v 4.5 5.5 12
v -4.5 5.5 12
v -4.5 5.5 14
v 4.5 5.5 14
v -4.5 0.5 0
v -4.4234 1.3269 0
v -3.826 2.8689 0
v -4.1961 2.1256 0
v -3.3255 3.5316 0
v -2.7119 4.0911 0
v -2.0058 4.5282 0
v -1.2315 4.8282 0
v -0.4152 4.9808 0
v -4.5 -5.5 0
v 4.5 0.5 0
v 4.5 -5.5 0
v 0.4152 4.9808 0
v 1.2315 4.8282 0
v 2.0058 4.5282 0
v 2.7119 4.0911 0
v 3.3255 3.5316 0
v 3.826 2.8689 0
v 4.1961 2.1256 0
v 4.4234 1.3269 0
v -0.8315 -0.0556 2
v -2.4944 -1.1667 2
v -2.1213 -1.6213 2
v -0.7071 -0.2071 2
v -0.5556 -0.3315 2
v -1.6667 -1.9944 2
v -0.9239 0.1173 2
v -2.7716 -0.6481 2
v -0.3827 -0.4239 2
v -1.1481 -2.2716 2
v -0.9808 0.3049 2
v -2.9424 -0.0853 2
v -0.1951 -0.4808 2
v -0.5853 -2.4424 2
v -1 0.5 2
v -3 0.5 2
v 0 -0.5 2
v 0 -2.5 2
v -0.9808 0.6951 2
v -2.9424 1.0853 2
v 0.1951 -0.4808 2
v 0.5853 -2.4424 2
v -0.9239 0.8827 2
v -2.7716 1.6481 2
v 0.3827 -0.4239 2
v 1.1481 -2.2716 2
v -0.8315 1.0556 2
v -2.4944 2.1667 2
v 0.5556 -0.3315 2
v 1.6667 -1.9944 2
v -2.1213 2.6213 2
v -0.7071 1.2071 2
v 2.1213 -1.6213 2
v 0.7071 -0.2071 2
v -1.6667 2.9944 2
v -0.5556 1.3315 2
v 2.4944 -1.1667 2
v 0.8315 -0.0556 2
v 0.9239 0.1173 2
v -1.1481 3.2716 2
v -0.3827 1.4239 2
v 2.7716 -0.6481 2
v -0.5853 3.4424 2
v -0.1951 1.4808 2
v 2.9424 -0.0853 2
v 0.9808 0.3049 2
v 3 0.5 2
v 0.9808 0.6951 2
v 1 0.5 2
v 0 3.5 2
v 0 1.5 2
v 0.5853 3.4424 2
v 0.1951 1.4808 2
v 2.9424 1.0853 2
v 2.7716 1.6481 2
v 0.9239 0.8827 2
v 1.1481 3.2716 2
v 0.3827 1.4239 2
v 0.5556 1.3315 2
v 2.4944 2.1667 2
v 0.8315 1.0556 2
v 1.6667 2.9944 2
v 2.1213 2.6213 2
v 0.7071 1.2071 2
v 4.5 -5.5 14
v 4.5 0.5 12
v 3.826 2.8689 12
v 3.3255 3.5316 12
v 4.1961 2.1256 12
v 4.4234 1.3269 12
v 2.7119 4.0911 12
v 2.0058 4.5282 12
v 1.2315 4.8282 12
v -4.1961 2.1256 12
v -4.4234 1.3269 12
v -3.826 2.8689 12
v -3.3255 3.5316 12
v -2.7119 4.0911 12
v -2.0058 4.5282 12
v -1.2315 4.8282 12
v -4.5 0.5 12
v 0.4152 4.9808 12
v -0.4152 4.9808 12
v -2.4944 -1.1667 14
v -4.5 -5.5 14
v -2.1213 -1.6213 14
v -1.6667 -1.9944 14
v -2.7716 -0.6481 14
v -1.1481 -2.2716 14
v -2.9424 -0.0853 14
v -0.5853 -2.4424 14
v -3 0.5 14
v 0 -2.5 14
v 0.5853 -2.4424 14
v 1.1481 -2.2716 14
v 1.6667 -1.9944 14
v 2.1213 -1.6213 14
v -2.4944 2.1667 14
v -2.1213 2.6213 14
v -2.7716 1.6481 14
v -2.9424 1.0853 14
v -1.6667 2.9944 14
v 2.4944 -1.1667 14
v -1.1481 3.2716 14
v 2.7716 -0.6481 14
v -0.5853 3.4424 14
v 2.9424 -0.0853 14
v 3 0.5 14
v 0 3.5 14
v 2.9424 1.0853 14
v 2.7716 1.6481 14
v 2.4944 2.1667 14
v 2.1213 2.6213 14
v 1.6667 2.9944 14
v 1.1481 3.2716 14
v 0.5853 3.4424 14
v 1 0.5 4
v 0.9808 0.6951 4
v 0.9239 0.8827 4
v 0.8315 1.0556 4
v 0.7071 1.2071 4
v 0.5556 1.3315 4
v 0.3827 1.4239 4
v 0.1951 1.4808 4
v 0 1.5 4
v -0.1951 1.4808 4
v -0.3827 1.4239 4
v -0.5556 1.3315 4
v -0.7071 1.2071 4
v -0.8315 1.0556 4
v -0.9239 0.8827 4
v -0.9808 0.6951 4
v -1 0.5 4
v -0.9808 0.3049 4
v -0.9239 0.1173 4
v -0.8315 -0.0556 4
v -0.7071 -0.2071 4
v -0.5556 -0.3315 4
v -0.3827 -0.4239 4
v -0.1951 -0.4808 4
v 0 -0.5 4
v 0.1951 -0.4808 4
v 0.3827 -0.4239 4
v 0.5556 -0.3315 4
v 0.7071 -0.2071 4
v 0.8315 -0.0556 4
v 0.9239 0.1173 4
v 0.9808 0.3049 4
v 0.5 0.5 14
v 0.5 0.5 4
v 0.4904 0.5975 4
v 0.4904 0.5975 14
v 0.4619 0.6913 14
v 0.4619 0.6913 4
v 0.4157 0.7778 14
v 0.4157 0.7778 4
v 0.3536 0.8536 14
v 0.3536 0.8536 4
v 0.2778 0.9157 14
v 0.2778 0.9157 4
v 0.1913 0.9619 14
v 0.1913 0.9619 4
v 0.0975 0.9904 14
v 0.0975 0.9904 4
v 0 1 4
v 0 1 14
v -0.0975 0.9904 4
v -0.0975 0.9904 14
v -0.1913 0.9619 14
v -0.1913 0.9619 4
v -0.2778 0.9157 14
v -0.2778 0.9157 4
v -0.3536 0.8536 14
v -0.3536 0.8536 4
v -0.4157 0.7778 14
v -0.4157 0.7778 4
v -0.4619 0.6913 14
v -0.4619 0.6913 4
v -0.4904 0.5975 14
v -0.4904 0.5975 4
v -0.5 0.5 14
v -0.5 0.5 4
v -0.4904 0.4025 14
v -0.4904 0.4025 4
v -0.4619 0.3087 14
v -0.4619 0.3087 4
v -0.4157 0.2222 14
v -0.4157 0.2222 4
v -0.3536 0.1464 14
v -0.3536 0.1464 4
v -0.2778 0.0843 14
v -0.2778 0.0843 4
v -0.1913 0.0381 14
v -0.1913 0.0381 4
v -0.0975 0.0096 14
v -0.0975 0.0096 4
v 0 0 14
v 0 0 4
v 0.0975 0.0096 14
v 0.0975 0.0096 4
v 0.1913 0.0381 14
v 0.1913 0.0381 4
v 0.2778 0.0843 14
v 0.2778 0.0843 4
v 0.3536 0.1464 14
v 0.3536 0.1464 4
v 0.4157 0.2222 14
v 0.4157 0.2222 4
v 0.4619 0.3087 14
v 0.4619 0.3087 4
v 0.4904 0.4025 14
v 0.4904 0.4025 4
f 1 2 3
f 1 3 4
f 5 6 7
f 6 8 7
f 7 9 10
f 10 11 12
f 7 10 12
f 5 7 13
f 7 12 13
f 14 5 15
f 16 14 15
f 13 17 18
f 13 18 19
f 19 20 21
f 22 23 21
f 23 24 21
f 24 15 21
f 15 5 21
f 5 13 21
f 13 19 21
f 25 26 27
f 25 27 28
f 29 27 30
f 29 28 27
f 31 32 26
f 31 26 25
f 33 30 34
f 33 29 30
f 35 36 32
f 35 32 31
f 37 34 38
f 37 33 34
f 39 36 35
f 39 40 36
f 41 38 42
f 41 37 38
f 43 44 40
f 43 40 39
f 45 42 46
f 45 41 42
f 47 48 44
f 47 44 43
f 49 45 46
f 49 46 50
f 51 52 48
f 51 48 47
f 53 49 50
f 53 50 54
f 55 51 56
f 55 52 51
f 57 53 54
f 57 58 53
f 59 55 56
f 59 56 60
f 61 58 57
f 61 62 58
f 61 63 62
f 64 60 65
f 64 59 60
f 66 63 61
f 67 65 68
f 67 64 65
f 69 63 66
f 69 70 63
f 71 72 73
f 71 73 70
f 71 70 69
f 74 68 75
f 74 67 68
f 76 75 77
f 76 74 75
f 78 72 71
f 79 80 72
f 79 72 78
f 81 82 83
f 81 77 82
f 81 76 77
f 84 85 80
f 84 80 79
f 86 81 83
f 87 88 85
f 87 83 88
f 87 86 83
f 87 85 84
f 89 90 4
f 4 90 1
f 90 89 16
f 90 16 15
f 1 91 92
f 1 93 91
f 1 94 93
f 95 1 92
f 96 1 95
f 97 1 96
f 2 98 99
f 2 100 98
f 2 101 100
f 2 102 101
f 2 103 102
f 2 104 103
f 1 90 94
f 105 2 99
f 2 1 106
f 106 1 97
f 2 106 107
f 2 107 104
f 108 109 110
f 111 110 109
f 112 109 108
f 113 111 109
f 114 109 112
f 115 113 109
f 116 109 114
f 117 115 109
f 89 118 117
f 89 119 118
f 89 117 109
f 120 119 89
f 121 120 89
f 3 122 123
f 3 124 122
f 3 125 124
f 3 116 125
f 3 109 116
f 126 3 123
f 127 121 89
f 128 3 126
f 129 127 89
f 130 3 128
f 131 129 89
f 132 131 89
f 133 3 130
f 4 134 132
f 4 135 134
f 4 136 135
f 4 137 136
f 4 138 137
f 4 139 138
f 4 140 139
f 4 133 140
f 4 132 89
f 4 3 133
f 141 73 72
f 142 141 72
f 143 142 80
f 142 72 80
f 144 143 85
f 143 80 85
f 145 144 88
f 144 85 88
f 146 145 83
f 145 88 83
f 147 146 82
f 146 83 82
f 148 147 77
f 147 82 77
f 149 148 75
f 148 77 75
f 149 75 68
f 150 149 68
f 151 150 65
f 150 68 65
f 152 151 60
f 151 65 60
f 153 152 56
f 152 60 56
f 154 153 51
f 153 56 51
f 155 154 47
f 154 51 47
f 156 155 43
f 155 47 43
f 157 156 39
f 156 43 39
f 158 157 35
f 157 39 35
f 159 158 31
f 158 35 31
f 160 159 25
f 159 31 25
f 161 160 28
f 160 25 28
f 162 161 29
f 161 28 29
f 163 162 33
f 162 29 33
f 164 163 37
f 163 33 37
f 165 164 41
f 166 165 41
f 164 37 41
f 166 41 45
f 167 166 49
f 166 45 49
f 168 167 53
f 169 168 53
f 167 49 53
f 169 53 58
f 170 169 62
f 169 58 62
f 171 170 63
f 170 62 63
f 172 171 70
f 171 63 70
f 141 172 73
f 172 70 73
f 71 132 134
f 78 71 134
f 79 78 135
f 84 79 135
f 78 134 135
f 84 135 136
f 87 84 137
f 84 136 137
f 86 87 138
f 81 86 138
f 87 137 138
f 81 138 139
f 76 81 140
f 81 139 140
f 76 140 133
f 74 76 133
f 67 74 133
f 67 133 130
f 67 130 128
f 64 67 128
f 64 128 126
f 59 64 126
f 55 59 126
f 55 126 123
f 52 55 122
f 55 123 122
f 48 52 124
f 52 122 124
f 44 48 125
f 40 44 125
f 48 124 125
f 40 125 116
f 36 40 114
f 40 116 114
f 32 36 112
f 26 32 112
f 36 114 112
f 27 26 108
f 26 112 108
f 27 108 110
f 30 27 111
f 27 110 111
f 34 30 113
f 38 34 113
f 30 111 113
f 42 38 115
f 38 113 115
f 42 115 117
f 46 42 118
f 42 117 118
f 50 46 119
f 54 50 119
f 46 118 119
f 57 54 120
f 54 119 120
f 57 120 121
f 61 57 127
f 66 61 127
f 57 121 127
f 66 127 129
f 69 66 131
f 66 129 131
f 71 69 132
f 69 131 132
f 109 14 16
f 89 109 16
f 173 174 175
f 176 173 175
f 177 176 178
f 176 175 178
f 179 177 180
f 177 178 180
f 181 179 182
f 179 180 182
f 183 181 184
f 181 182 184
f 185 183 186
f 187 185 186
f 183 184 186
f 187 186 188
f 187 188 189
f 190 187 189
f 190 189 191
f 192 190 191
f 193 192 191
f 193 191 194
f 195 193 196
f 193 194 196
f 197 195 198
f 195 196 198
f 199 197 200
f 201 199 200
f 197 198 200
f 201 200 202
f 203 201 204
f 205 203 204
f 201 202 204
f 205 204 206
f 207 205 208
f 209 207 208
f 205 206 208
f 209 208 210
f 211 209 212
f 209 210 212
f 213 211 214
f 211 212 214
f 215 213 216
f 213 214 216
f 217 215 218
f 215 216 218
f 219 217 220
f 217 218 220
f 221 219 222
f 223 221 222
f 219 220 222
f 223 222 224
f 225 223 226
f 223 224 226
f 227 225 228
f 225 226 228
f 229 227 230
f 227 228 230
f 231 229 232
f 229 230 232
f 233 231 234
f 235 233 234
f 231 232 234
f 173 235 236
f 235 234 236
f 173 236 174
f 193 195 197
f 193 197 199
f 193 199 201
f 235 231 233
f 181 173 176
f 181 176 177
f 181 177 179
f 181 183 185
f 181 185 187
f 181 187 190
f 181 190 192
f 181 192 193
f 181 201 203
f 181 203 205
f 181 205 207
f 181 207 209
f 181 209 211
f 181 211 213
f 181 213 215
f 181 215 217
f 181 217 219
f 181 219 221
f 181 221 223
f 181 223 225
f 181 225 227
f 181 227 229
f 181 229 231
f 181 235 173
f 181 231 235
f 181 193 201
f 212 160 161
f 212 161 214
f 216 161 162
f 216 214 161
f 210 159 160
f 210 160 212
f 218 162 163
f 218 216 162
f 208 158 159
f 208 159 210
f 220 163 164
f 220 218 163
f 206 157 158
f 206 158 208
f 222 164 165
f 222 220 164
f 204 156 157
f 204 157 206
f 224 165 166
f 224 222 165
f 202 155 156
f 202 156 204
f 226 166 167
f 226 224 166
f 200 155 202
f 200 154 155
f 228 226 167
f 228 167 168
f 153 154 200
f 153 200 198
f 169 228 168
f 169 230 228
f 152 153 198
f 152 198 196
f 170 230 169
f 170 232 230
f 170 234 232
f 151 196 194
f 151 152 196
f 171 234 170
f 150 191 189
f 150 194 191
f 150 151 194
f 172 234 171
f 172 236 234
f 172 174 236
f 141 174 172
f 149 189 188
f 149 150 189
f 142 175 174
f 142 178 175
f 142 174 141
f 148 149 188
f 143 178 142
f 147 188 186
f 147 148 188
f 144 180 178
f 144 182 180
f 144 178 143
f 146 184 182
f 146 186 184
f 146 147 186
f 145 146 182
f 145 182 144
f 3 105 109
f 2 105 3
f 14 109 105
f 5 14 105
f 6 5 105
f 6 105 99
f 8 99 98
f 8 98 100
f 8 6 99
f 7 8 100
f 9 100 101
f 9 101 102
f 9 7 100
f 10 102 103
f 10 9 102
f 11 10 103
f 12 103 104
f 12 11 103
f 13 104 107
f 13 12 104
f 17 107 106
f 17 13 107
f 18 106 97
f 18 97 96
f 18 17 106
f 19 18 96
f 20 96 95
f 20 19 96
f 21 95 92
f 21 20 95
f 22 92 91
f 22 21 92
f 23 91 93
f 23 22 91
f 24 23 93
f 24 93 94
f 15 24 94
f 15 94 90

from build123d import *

# Parameters (mm, degrees)
SKETCH1_W           = 9
SKETCH1_H           = 11
BOSS_EXTRUDE1_DEPTH = 14
SKETCH2_R           = 3
CUT_EXTRUDE1_DEPTH  = 12
SKETCH3_OUTSIDE_W   = 14.99
SKETCH3_OUTSIDE_H   = 16.99
CUT_EXTRUDE2_DEPTH  = 12
SKETCH4_R           = 1
BOSS_EXTRUDE2_DEPTH = 2
SKETCH5_R           = 0.5
BOSS_EXTRUDE3_DEPTH = 10


with BuildPart() as part:
    # Sketch1 → Boss-Extrude1 (new body)
    with BuildSketch(Plane.XY):
        Rectangle(SKETCH1_W, SKETCH1_H)
    extrude(amount=BOSS_EXTRUDE1_DEPTH)

    # Sketch2 → Cut-Extrude1 (cut)
    with BuildSketch(Plane.XY.offset(14)):
        with Locations((0, 0.5)):
            Circle(SKETCH2_R)
    extrude(amount=-CUT_EXTRUDE1_DEPTH, mode=Mode.SUBTRACT)

    # Sketch3 outside → Cut-Extrude2 (cut)
    with BuildSketch(Plane(origin=(0, 0, 0), x_dir=(-1, 0, 0), z_dir=(0, 0, -1))):
        Rectangle(SKETCH3_OUTSIDE_W, SKETCH3_OUTSIDE_H)
        with BuildLine():
            Line((-4.5, 0.5), (-4.5, -5.5))
            Line((-4.5, -5.5), (4.5, -5.5))
            Line((4.5, -5.5), (4.5, 0.5))
            ThreePointArc((4.5, 0.5), (0, 5), (-4.5, 0.5))
        make_face(mode=Mode.SUBTRACT)
    extrude(amount=-CUT_EXTRUDE2_DEPTH, mode=Mode.SUBTRACT)

    # Sketch4 → Boss-Extrude2 (add)
    with BuildSketch(Plane.XY.offset(2)):
        with Locations((0, 0.5)):
            Circle(SKETCH4_R)
    extrude(amount=BOSS_EXTRUDE2_DEPTH)

    # Sketch5 → Boss-Extrude3 (add)
    with BuildSketch(Plane.XY.offset(4)):
        with Locations((0, 0.5)):
            Circle(SKETCH5_R)
    extrude(amount=BOSS_EXTRUDE3_DEPTH)


solid = part.part
